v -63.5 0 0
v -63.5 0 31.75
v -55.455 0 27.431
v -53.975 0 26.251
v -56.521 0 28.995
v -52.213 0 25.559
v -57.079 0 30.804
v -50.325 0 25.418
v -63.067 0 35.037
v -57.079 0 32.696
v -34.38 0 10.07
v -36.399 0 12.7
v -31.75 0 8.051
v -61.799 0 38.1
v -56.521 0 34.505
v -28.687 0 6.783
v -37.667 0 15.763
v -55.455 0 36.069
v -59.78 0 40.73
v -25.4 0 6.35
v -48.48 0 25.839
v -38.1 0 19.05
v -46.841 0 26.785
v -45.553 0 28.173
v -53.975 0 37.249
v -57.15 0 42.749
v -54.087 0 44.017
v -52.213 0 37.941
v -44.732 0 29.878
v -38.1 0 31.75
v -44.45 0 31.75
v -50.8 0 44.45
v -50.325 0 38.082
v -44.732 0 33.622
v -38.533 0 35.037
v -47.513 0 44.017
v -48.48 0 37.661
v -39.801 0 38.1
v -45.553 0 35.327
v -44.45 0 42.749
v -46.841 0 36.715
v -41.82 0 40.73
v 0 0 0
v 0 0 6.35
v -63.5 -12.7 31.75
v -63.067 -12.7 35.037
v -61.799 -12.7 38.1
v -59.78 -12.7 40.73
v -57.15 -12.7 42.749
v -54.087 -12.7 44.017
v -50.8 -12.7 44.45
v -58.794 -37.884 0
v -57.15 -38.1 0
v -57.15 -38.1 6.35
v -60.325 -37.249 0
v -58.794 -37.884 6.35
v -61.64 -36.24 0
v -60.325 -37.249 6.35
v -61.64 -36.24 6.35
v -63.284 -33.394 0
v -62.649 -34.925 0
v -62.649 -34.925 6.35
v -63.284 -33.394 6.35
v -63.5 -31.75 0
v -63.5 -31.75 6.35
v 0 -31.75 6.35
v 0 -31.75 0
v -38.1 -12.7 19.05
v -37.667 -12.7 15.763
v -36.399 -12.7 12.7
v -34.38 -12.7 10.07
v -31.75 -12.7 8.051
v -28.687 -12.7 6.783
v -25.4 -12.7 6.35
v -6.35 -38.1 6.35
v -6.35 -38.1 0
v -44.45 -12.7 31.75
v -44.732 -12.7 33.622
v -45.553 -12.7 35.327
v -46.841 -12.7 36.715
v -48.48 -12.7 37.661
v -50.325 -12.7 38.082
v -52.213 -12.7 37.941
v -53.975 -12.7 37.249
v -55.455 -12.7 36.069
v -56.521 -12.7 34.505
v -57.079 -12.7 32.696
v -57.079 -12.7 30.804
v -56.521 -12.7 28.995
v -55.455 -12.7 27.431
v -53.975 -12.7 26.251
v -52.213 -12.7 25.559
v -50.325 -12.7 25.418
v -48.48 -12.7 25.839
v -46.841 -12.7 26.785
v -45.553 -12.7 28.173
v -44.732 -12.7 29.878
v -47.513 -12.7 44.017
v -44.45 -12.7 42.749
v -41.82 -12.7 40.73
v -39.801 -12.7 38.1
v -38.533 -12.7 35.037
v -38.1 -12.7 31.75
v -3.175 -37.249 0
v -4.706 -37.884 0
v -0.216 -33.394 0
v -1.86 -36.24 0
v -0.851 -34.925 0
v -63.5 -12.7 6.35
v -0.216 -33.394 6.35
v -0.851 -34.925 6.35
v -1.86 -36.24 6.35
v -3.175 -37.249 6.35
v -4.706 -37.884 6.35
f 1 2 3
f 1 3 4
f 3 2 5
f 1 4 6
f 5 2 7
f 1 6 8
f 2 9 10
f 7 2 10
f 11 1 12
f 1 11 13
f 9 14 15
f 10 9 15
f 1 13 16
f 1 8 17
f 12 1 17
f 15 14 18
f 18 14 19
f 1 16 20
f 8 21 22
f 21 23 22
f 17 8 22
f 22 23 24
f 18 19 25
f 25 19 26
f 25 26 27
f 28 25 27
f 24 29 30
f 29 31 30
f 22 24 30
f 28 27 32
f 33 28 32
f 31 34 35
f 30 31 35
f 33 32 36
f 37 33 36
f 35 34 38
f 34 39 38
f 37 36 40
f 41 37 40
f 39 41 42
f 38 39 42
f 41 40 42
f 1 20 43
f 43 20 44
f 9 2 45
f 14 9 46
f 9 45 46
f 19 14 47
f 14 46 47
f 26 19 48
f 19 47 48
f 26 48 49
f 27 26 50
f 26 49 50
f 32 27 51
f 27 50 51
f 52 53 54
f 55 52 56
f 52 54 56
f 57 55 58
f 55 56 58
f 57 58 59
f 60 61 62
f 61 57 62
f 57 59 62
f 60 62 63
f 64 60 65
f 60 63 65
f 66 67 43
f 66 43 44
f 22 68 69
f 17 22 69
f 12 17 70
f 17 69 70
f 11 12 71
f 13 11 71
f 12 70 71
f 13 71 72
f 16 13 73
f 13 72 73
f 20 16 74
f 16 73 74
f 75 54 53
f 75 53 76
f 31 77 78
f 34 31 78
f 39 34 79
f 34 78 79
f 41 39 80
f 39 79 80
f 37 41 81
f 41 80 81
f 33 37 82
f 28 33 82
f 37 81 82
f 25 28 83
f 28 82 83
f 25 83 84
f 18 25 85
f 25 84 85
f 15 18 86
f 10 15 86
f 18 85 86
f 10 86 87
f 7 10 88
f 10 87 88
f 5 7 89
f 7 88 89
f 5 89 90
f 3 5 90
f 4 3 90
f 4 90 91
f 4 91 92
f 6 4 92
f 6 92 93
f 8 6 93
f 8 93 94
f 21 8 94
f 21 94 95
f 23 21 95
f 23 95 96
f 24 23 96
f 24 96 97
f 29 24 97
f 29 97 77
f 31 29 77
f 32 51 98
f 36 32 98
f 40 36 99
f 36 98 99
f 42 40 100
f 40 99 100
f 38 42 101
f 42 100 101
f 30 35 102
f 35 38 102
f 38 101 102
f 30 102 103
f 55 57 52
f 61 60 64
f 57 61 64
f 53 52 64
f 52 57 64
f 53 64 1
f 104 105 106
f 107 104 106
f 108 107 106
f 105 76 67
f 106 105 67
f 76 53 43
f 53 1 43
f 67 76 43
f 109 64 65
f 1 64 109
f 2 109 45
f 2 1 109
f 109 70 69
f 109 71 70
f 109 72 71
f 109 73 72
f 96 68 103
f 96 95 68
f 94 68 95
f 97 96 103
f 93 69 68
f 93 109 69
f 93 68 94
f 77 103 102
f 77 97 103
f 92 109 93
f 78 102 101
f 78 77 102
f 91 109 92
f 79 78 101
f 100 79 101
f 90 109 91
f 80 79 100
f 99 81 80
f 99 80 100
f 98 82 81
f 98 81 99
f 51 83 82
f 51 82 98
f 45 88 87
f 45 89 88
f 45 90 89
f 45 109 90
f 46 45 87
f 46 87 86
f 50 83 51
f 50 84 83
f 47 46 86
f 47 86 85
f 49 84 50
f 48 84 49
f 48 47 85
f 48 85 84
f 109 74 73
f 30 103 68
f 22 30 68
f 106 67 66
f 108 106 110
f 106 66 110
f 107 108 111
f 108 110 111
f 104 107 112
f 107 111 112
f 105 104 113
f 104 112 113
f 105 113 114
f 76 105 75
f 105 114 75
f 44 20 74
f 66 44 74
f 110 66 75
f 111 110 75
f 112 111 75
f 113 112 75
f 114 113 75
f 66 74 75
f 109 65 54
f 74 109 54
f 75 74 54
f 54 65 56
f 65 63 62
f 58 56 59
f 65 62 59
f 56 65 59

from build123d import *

# Parameters (mm, degrees)
F0_W      = 63.5
F0_H      = 44.45
F1_DEPTH  = 38.1
F2_W      = 25.4
F2_H      = 38.1
F3_DEPTH  = 63.501
F4_W      = 25.4
F4_H      = 38.1
F5_DEPTH  = 12.701
F7_DEPTH  = 12.701
F8_R      = 6.35
F9_DEPTH  = 12.701
F11_DEPTH = 12.701
F13_DEPTH = 12.701
F15_DEPTH = 25.4
F17_DEPTH = 6.351


with BuildPart() as f1:
    # F0 (on Front) → F1 (new body)
    with BuildSketch(Plane.XZ):
        with Locations((-31.75, 22.225)):
            Rectangle(F0_W, F0_H)
    extrude(amount=F1_DEPTH)

    # F2 (on face) → F3 (cut, through all)
    with BuildSketch(Plane(origin=(-63.5, 0, 0), x_dir=(0, -1, 0), z_dir=(-1, 0, 0))):
        with Locations((25.4, 25.4)):
            Rectangle(F2_W, F2_H)
    extrude(amount=-F3_DEPTH, mode=Mode.SUBTRACT)

    # F4 (on face) → F5 (cut, through all)
    with BuildSketch(Plane.XZ.offset(12.7)):
        with Locations((-12.7, 25.4)):
            Rectangle(F4_W, F4_H)
    extrude(amount=-F5_DEPTH, mode=Mode.SUBTRACT)

    # F6 (on face) → F7 (cut, through all)
    with BuildSketch(Plane.XZ.offset(12.7)):
        with BuildLine():
            Line((-38.1, 44.45), (-50.8, 44.45))
            ThreePointArc((-50.8, 44.45), (-41.8197438789, 40.7302561211), (-38.1, 31.75))
            Line((-38.1, 31.75), (-38.1, 44.45))
        make_face()
        with BuildLine():
            Line((-50.8, 44.45), (-63.5, 44.45))
            Line((-63.5, 44.45), (-63.5, 31.75))
            ThreePointArc((-63.5, 31.75), (-59.7802561211, 40.7302561211), (-50.8, 44.45))
        make_face()
    extrude(amount=-F7_DEPTH, mode=Mode.SUBTRACT)

    # F8 (on face) → F9 (cut, through all)
    with BuildSketch(Plane.XZ.offset(12.7)):
        with Locations((-50.8, 31.75)):
            Circle(F8_R)
    extrude(amount=-F9_DEPTH, mode=Mode.SUBTRACT)

    # F10 (on face) → F11 (cut, through all)
    with BuildSketch(Plane.XZ.offset(12.7)):
        Polygon((-38.1, 44.45), (-38.1, 31.75), (-38.1, 19.05), (-25.4, 19.05), (-25.4, 44.45), align=None)
    extrude(amount=-F11_DEPTH, mode=Mode.SUBTRACT)

    # F12 (on face) → F13 (cut, through all)
    with BuildSketch(Plane.XZ.offset(12.7)):
        with BuildLine():
            Line((-25.4, 19.05), (-38.1, 19.05))
            ThreePointArc((-38.1, 19.05), (-34.3802561211, 10.0697438789), (-25.4, 6.35))
            Line((-25.4, 6.35), (-25.4, 19.05))
        make_face()
    extrude(amount=-F13_DEPTH, mode=Mode.SUBTRACT)

    # F14 (on face) → F15 (cut)
    with BuildSketch(Plane.XY.offset(6.35)):
        with BuildLine():
            Line((-63.5, -31.75), (-63.5, -38.1))
            Line((-63.5, -38.1), (-57.15, -38.1))
            ThreePointArc((-57.15, -38.1), (-61.6401280605, -36.2401280605), (-63.5, -31.75))
        make_face()
    extrude(amount=-F15_DEPTH, mode=Mode.SUBTRACT)

    # F16 (on face) → F17 (cut, through all)
    with BuildSketch(Plane.XY.offset(6.35)):
        with BuildLine():
            Line((-6.35, -38.1), (0, -38.1))
            Line((0, -38.1), (0, -31.75))
            ThreePointArc((0, -31.75), (-1.8598719395, -36.2401280605), (-6.35, -38.1))
        make_face()
    extrude(amount=-F17_DEPTH, mode=Mode.SUBTRACT)


solid = f1.part
